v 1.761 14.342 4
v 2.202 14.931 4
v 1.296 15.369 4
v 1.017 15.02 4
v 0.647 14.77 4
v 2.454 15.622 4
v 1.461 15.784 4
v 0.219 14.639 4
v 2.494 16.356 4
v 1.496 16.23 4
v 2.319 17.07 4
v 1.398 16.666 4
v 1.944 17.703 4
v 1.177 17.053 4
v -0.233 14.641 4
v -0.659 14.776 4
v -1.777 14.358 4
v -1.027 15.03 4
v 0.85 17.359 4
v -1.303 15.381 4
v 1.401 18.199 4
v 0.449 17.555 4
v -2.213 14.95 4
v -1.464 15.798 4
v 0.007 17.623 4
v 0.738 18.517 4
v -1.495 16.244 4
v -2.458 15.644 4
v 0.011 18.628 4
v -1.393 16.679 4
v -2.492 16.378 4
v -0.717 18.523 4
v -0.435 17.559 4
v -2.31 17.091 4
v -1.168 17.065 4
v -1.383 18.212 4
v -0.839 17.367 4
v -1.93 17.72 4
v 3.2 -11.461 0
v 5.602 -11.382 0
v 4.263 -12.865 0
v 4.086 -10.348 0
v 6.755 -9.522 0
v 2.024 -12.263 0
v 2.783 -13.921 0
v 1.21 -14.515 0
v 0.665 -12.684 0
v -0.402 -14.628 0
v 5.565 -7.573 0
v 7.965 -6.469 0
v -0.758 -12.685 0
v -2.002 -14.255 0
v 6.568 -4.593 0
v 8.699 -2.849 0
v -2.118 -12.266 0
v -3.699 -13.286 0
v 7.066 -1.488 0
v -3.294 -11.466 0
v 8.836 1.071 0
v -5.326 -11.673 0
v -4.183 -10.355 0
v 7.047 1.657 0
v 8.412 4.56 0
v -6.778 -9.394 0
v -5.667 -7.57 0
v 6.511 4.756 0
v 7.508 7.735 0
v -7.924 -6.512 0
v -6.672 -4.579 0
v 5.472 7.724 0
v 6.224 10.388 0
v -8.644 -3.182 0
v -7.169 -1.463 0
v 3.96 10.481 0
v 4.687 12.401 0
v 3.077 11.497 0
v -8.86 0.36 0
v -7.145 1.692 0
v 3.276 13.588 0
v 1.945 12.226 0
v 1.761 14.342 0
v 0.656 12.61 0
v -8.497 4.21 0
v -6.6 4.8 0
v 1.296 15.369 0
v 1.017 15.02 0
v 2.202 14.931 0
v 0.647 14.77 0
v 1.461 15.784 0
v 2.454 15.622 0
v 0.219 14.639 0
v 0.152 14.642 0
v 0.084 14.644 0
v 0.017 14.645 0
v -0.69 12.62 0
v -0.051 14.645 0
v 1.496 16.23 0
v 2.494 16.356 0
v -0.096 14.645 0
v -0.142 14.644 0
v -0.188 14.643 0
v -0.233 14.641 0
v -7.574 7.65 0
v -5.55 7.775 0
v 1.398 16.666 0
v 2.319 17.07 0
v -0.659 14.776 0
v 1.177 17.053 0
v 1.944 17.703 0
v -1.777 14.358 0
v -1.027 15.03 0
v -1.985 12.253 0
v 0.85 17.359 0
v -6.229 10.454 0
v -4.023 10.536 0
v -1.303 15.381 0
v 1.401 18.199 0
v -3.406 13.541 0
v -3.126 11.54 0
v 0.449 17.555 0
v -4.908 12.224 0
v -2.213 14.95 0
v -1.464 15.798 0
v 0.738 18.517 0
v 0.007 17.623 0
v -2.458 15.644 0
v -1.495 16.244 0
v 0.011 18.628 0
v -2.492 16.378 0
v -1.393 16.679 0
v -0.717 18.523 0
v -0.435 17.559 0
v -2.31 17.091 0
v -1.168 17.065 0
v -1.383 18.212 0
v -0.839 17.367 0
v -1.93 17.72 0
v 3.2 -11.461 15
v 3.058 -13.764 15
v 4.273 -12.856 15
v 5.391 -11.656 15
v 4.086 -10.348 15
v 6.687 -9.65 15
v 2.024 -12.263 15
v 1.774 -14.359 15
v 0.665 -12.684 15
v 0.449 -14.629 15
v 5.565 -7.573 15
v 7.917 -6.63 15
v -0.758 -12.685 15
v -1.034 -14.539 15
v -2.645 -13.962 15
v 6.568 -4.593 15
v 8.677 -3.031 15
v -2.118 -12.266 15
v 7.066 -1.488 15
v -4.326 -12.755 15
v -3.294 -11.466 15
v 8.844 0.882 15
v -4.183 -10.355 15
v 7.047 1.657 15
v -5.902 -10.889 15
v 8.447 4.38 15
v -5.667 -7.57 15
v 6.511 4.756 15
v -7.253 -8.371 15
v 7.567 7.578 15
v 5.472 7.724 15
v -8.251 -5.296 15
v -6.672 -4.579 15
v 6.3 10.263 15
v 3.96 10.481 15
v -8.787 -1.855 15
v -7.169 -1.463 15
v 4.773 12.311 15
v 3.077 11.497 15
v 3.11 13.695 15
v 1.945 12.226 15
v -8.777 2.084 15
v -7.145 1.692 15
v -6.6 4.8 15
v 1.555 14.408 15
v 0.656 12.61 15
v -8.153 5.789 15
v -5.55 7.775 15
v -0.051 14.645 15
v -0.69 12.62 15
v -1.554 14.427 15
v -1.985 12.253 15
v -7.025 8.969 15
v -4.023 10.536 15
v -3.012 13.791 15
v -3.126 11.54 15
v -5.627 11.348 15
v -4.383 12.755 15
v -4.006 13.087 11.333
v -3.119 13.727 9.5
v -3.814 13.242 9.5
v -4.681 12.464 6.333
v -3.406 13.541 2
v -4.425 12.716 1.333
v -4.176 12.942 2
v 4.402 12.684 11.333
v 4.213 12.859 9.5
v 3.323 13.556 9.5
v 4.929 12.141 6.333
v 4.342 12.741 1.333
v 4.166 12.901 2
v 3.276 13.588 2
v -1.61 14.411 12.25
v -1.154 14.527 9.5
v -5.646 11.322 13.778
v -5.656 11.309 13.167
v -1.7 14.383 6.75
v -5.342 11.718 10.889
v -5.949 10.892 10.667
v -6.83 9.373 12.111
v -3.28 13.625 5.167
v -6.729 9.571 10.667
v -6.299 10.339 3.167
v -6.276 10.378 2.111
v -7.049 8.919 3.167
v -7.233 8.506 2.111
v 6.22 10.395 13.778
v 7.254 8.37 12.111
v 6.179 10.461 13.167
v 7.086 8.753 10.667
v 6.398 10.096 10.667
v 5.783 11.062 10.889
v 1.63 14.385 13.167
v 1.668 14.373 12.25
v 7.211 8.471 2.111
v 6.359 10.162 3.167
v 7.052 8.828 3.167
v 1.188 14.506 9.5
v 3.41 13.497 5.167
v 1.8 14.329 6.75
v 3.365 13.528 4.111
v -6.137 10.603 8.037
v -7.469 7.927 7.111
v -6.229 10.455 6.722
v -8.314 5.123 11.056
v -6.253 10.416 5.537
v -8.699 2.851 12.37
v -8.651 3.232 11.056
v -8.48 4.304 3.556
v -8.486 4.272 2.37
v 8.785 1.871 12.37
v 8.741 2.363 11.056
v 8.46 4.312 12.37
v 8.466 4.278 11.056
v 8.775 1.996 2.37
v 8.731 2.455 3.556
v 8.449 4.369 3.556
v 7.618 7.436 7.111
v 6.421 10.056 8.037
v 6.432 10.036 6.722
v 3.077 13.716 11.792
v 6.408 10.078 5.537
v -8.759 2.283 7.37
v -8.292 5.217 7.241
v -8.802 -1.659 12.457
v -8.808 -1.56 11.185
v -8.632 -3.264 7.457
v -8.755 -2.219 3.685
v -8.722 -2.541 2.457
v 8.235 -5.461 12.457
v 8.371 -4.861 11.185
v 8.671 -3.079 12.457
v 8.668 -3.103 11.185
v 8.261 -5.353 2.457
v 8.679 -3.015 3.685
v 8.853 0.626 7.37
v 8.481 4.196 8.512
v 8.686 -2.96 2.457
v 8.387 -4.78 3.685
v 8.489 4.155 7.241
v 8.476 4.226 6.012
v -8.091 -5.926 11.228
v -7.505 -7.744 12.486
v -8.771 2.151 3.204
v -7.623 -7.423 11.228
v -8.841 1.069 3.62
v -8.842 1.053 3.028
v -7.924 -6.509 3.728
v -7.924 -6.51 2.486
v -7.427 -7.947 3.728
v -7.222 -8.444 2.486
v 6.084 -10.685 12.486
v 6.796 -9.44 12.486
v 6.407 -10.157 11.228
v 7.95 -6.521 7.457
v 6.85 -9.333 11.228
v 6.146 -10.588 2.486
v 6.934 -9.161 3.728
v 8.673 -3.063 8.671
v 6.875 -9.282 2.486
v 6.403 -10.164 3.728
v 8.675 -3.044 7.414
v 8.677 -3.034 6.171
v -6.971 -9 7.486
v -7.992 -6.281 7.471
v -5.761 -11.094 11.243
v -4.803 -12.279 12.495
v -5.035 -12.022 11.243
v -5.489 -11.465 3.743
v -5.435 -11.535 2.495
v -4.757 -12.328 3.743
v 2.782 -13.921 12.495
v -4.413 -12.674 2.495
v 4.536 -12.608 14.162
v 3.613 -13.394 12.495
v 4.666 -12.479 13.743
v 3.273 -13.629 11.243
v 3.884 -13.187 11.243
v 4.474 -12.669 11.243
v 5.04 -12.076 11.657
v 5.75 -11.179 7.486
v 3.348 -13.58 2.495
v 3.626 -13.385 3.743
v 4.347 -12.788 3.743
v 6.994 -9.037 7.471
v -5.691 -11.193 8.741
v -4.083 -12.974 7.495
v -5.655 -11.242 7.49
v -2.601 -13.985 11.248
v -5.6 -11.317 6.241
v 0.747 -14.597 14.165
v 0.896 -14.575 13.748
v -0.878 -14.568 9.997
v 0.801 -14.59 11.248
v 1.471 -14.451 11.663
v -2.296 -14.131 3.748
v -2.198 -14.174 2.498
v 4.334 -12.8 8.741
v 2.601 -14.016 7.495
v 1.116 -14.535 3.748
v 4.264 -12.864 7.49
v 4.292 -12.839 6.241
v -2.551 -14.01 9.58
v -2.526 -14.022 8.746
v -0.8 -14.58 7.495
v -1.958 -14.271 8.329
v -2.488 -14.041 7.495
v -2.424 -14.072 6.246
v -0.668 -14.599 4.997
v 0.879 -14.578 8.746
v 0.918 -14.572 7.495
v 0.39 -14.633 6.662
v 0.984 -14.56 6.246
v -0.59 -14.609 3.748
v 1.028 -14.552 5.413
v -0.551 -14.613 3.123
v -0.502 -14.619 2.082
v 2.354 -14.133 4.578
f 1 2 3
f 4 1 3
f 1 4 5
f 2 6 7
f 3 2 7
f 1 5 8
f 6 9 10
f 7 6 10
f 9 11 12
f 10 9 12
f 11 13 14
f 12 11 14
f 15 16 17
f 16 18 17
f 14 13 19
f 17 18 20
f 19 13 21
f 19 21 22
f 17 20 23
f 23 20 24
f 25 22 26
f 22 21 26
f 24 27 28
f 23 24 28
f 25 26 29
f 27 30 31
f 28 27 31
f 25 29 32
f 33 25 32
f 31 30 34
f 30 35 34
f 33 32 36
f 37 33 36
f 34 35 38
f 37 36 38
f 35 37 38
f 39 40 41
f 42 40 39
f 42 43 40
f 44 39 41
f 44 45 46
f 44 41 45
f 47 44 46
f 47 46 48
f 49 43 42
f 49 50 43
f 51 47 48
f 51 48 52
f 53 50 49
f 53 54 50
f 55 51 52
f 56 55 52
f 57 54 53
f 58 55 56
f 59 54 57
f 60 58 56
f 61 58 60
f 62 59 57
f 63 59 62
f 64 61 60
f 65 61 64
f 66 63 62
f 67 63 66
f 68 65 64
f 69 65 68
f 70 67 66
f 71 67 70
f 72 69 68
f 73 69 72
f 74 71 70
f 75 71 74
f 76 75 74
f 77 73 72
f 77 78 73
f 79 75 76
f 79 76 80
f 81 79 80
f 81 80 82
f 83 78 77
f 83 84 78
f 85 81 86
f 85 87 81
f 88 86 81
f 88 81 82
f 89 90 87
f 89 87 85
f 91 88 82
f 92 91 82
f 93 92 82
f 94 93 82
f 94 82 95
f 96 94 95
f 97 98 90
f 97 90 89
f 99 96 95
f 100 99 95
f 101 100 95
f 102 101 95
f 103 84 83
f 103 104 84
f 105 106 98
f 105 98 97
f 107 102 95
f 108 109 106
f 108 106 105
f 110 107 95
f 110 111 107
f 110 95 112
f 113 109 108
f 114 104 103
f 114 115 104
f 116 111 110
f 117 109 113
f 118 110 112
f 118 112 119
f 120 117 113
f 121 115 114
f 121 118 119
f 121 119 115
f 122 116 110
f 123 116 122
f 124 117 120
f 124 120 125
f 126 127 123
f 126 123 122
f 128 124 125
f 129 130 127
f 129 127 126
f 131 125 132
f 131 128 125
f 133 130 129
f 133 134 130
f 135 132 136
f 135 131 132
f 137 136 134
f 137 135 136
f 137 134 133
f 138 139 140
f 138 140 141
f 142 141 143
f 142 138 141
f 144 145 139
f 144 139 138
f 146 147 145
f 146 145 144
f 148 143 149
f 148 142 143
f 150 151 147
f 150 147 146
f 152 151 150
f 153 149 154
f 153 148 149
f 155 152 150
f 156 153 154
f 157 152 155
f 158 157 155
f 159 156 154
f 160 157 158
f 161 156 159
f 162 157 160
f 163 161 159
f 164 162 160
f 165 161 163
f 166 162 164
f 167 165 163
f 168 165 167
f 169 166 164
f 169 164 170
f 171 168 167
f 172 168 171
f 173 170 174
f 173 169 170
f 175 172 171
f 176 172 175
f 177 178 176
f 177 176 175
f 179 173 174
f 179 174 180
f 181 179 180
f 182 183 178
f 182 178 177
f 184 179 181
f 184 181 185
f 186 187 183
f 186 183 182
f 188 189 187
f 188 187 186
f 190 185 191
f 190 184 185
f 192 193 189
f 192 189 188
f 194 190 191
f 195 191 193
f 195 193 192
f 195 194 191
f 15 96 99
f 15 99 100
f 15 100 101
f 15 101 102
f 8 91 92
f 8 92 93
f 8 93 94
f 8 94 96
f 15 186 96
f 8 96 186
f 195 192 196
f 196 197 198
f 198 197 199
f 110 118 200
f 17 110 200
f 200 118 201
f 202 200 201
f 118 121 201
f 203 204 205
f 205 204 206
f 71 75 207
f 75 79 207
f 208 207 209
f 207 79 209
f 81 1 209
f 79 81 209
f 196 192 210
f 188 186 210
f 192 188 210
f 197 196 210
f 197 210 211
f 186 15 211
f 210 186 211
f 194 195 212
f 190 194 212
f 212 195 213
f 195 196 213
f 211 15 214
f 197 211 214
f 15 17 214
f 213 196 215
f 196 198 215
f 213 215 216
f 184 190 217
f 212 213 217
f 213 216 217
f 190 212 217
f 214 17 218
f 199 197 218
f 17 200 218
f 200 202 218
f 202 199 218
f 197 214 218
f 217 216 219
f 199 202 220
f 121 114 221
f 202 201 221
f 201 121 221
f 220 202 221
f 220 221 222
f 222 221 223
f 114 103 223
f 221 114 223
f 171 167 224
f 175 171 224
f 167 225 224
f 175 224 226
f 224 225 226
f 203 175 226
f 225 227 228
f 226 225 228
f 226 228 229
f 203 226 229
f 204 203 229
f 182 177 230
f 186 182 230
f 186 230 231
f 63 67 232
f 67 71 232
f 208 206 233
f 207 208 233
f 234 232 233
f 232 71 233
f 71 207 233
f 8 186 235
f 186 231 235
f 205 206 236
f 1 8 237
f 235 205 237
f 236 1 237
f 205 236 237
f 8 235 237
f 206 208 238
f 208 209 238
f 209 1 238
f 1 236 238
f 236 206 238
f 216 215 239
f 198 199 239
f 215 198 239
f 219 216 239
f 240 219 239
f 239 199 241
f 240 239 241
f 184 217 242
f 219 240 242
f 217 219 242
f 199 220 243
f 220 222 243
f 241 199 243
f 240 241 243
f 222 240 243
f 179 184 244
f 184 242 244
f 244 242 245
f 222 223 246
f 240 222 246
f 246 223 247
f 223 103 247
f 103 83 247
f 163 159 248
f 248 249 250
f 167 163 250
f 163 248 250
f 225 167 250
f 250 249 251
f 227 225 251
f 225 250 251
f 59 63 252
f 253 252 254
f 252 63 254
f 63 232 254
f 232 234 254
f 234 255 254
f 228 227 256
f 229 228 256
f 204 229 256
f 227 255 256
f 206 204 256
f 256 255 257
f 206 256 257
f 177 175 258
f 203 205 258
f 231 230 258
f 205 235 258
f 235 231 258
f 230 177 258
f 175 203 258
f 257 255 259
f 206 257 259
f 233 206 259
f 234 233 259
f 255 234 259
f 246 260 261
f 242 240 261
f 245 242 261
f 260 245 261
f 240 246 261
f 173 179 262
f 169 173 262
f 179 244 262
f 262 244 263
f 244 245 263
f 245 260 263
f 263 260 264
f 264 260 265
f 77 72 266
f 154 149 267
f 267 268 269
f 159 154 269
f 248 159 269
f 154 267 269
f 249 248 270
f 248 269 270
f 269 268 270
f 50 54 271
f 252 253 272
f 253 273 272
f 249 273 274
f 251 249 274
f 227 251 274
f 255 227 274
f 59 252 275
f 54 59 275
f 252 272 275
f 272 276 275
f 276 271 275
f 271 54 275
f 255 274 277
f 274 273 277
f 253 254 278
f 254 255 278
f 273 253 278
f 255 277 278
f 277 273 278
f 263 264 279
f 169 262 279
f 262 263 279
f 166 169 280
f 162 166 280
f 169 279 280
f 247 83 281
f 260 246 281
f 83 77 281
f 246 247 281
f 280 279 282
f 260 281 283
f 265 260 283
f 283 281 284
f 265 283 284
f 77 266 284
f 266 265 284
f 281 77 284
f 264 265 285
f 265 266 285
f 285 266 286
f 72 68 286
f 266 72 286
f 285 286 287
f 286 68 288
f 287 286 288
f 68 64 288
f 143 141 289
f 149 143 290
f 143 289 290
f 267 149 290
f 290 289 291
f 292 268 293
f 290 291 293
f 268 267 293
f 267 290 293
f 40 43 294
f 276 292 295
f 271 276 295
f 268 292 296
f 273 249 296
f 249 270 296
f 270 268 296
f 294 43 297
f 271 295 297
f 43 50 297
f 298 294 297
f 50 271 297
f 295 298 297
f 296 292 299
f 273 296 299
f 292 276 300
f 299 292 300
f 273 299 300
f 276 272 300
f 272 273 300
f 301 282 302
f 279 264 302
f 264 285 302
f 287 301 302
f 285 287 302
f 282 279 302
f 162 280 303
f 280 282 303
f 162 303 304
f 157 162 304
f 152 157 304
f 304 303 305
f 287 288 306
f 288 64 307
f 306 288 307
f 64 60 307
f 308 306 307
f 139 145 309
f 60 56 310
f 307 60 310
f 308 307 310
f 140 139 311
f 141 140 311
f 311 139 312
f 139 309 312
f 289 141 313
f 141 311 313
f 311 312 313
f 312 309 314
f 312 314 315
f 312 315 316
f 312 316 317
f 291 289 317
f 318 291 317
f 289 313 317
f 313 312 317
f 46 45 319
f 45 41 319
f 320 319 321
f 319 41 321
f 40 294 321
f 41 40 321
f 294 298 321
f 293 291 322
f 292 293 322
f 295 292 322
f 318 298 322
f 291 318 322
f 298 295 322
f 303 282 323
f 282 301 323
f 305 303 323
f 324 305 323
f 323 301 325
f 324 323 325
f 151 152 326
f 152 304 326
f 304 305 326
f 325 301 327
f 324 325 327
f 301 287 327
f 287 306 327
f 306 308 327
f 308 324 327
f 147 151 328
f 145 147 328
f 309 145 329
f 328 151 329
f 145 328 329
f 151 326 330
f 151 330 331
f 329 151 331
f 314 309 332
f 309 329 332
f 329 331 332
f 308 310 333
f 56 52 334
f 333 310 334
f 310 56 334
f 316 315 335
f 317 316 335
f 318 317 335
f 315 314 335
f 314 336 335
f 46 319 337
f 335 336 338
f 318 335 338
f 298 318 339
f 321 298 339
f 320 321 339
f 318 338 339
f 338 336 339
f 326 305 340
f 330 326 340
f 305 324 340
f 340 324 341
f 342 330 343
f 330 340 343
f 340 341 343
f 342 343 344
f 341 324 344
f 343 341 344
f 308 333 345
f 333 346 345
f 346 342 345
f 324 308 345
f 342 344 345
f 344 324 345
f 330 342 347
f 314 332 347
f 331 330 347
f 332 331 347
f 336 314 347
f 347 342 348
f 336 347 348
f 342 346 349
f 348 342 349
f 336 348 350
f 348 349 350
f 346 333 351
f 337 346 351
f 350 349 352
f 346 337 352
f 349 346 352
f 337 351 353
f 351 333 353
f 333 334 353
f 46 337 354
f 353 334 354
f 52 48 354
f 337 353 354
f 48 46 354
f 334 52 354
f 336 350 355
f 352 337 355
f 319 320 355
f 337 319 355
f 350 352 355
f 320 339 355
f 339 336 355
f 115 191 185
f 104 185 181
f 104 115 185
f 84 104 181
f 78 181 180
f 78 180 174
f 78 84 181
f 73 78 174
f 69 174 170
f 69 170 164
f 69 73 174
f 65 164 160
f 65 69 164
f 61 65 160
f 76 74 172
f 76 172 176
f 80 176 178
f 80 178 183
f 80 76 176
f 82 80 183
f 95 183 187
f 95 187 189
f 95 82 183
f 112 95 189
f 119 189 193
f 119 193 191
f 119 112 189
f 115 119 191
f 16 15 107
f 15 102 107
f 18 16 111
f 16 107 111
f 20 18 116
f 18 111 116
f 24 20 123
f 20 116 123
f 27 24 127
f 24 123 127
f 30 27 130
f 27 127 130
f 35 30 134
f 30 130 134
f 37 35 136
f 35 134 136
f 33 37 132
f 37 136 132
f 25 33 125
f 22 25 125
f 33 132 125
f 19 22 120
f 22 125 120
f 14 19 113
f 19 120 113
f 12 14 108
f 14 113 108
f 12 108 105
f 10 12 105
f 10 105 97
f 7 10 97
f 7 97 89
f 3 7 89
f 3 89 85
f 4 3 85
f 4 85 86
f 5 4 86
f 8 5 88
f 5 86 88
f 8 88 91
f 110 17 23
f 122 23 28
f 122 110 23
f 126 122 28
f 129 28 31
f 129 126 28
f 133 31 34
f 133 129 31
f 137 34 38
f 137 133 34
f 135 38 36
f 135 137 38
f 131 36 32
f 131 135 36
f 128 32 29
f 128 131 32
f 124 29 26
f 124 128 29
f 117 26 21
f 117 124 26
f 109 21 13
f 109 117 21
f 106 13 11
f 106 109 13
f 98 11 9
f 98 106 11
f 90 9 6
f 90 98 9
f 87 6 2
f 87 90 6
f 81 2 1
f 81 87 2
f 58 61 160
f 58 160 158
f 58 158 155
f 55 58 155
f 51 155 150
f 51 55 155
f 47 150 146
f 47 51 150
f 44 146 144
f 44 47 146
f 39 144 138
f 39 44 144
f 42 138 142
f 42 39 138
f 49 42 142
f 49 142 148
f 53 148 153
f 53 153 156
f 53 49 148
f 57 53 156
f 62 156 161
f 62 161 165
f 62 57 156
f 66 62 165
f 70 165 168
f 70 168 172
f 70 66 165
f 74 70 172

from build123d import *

# Parameters (mm, degrees)
ESQUISSE1_RX       = 14.645218004
ESQUISSE1_RY       = 8.862181001
BOSS_EXTRU_1_DEPTH = 15
ESQUISSE2_R        = 2.504582132
ESQUISSE2_R_2      = 1.5
BOSS_EXTRU_2_DEPTH = 4


with BuildPart() as part:
    # Esquisse1 → Boss.-Extru.1 (new body)
    with BuildSketch(Plane.XY):
        with Locations(Location((0, 0), (0, 0, 90.199055458))):
            Ellipse(ESQUISSE1_RX, ESQUISSE1_RY)
        with BuildLine():
            ThreePointArc((3.959542455, 10.480889746), (-0.016909511, 12.662493409), (-4.023209588, 10.536199809))
            ThreePointArc((-4.023209588, 10.536199809), (-7.222063109, 0.114609256), (-4.182661935, -10.354595777))
            ThreePointArc((-4.182661935, -10.354595777), (-0.046425778, -12.737390641), (4.086244093, -10.348415831))
            ThreePointArc((4.086244093, -10.348415831), (7.121864374, 0.085087548), (3.959542455, 10.480889746))
        make_face(mode=Mode.SUBTRACT)
    extrude(amount=BOSS_EXTRU_1_DEPTH)

    # Esquisse2 → Boss.-Extru.2 (add)
    with BuildSketch(Plane(origin=(0, 0, 0), x_dir=(-1, 0, 0), z_dir=(0, 0, -1))):
        with Locations((0, 16.123170266)):
            Circle(ESQUISSE2_R)
        with Locations((0, 16.123170266)):
            Circle(ESQUISSE2_R_2, mode=Mode.SUBTRACT)
    extrude(amount=-BOSS_EXTRU_2_DEPTH)


solid = part.part
